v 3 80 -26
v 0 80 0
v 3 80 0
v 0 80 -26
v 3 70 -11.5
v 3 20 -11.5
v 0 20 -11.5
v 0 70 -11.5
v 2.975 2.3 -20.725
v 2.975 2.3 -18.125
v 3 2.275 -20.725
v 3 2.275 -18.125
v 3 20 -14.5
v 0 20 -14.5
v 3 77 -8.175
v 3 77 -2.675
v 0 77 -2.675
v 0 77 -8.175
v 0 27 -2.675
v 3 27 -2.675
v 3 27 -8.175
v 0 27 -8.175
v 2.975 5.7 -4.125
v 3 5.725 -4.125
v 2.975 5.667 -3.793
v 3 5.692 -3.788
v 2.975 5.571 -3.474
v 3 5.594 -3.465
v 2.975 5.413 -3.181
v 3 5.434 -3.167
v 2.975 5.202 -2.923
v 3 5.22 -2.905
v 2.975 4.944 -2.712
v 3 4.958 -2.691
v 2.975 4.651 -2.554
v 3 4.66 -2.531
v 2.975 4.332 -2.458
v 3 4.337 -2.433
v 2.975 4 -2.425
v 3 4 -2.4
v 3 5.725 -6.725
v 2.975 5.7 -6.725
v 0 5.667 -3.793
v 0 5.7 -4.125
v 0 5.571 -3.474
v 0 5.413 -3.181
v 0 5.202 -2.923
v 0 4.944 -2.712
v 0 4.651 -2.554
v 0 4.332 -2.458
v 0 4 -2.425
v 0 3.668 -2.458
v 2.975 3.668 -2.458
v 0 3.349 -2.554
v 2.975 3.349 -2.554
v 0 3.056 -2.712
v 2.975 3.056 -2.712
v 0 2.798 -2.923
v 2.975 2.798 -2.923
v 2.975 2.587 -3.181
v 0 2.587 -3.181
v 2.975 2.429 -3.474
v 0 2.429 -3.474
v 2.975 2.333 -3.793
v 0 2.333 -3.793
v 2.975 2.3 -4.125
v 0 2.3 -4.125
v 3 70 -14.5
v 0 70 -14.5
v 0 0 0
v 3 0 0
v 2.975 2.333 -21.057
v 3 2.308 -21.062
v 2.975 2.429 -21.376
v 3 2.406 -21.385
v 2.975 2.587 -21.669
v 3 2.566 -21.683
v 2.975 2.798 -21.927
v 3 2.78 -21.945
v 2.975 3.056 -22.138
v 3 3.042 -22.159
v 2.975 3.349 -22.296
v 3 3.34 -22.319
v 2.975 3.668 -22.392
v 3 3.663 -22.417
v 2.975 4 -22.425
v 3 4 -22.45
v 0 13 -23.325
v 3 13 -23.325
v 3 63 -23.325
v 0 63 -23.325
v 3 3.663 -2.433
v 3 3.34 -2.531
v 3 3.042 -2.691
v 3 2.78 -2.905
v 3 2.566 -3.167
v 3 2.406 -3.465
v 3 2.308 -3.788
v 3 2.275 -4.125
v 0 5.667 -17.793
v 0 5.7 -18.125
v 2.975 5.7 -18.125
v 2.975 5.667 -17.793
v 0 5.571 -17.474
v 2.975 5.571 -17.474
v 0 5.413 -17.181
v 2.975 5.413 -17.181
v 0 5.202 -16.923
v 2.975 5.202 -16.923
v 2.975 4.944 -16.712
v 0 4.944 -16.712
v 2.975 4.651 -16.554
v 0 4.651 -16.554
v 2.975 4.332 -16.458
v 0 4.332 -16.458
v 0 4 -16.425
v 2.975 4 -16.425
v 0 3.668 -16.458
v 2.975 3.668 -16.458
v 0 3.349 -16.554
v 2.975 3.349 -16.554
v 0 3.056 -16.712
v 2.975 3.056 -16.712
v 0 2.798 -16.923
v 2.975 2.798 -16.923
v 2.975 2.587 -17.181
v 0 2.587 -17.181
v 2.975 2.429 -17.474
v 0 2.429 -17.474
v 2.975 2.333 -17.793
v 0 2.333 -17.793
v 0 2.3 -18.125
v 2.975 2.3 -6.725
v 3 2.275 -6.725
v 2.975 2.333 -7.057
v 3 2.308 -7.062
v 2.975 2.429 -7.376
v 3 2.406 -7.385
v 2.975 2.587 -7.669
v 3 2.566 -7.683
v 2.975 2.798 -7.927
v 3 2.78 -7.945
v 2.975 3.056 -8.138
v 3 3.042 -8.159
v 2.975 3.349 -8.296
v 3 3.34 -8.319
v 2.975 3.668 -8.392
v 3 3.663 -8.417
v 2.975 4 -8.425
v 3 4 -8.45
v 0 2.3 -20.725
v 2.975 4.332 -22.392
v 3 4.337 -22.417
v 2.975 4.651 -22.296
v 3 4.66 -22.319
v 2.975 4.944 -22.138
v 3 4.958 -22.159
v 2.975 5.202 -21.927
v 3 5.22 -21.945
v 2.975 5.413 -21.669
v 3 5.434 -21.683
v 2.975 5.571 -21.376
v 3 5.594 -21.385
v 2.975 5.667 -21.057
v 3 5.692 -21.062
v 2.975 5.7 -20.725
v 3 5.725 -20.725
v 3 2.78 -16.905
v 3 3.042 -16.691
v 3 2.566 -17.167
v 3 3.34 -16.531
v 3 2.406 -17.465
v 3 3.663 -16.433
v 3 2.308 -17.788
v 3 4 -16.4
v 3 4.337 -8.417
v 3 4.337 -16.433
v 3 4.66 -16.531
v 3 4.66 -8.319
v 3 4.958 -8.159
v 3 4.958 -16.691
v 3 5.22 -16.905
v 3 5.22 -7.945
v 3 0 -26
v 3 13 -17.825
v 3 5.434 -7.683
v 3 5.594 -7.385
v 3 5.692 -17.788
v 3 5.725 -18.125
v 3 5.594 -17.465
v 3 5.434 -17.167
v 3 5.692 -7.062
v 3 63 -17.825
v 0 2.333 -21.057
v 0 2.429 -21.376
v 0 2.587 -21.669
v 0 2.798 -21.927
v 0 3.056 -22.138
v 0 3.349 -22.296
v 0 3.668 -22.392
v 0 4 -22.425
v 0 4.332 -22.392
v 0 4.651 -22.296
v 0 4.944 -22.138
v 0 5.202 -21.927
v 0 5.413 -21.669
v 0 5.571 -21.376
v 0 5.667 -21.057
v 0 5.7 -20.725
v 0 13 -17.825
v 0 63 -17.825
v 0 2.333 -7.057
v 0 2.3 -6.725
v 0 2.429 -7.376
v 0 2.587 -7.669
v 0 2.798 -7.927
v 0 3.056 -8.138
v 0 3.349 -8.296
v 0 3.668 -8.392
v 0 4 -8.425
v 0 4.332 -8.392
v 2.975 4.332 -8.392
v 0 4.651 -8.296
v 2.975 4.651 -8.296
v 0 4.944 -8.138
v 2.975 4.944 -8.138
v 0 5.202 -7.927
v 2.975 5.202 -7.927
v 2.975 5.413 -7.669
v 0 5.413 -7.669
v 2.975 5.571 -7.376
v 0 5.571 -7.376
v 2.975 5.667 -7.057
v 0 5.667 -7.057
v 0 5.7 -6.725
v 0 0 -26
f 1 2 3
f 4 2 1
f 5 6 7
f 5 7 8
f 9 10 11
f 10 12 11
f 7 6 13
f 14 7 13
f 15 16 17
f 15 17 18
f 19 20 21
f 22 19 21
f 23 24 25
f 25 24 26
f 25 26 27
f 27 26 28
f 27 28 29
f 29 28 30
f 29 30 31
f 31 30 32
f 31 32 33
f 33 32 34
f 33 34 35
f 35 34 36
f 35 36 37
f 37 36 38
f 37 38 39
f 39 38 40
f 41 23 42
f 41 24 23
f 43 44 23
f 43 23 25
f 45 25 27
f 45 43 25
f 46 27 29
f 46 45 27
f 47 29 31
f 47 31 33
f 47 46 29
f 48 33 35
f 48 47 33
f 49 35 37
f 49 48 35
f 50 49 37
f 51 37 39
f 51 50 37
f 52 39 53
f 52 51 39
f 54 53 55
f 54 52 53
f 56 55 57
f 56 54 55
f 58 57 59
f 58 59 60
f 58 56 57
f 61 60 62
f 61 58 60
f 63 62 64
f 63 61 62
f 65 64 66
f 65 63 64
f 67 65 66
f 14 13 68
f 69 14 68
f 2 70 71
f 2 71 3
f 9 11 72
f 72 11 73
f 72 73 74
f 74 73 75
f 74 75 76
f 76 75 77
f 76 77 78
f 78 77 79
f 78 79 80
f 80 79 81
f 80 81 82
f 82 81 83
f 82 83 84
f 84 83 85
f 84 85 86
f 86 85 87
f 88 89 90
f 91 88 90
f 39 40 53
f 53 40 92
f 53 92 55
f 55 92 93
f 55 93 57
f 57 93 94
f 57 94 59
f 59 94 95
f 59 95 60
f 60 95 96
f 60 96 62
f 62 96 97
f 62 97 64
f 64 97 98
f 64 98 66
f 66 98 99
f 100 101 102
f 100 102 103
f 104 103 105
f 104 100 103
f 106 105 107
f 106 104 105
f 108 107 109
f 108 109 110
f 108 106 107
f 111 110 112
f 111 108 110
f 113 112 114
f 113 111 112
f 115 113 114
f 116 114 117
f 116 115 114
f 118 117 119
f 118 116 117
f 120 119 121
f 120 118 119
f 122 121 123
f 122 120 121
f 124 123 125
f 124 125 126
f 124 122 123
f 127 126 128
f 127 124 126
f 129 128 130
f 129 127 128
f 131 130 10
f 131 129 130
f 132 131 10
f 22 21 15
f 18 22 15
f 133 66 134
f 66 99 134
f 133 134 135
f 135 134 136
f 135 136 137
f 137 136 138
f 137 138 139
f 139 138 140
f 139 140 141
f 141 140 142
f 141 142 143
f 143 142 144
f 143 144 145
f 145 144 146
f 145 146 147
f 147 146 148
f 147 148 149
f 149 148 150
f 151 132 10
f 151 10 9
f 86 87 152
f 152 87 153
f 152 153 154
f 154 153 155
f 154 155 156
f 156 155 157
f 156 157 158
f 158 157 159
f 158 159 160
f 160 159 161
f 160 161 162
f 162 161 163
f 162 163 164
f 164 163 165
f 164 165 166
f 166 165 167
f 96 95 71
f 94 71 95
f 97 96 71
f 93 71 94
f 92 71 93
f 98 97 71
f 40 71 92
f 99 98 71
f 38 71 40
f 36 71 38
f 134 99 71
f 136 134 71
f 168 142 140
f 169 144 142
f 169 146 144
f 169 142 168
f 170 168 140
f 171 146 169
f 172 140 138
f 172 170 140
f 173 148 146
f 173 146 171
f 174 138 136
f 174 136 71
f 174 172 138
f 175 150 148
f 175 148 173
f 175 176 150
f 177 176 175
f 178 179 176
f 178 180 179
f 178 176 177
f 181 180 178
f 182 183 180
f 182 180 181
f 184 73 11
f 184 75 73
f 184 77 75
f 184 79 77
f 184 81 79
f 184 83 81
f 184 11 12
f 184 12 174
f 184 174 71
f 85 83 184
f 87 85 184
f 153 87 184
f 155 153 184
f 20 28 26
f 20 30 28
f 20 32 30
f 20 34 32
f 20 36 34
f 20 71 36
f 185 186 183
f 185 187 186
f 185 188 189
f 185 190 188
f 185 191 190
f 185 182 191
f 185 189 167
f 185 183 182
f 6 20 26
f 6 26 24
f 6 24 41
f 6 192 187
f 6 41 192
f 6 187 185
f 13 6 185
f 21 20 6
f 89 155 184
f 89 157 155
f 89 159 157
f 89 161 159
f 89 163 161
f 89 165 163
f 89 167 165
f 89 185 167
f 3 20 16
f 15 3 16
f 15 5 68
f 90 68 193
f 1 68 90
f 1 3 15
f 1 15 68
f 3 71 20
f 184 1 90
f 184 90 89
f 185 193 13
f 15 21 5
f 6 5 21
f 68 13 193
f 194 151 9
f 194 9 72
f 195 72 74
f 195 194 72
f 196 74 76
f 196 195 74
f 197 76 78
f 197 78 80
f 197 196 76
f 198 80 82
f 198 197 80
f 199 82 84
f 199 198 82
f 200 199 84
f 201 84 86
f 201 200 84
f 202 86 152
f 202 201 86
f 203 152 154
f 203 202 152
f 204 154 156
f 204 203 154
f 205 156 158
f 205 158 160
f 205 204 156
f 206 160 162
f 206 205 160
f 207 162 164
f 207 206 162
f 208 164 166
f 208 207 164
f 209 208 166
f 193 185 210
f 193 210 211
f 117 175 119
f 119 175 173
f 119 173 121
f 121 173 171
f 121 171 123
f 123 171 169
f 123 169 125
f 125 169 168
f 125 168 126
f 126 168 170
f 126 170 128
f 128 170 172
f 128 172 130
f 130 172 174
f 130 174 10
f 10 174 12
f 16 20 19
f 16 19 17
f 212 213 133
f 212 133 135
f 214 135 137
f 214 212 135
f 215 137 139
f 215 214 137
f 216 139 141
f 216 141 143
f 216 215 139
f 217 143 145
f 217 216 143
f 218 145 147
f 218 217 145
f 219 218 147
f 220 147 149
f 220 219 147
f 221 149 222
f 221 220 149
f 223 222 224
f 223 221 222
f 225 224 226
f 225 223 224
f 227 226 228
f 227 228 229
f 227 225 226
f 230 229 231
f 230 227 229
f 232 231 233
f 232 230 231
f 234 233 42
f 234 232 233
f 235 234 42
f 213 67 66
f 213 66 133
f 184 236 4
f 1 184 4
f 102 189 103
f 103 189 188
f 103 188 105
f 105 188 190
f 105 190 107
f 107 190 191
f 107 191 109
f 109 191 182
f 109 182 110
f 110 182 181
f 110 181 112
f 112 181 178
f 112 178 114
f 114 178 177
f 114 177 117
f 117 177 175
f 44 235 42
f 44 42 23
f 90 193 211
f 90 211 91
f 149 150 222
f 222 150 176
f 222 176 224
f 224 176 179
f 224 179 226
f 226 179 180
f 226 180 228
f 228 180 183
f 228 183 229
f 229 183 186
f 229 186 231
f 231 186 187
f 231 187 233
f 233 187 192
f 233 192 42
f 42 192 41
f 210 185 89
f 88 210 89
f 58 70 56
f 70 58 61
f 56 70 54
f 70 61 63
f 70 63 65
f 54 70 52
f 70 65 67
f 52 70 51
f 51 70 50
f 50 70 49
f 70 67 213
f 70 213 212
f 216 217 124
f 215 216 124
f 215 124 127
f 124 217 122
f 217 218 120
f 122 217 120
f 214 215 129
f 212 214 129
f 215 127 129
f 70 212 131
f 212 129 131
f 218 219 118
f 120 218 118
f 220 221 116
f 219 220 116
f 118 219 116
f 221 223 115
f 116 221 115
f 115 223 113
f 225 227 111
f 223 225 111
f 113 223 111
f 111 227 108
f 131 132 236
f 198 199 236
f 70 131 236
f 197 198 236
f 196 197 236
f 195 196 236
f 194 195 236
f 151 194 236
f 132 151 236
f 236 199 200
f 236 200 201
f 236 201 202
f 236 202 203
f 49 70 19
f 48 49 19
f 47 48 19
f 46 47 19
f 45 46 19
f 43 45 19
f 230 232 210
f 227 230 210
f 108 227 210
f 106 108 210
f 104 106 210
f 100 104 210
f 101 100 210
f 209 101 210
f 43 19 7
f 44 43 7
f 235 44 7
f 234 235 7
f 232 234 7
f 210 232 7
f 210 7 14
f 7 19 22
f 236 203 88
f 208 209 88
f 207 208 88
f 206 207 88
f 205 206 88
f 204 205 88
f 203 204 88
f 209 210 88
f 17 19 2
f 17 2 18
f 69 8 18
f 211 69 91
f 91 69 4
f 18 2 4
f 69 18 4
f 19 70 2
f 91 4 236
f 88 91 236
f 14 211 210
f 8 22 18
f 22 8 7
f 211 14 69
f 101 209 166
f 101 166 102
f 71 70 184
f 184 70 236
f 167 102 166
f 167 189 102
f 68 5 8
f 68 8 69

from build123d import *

# Parameters (mm, degrees)
SKETCH1_W                = 26
SKETCH1_H                = 80
BOSS_EXTRUDE1_DEPTH      = 3
SKETCH2_W                = 5.5
SKETCH2_H                = 50
SKETCH2_W_2              = 3
CUT_EXTRUDE1_DEPTH       = 3
M3_START                 = -1
M3_CLEARANCE_SLOT1_DEPTH = 5


with BuildPart() as part:
    # Sketch1 → Boss-Extrude1 (new body)
    with BuildSketch(Plane(origin=(0, 0, 0), x_dir=(0, 0, -1), z_dir=(1, 0, 0))):
        with Locations((13, 40)):
            Rectangle(SKETCH1_W, SKETCH1_H)
    extrude(amount=BOSS_EXTRUDE1_DEPTH)

    # Sketch2 → Cut-Extrude1 (cut)
    with BuildSketch(Plane(origin=(3, 0, 0), x_dir=(0, 0, -1), z_dir=(1, 0, 0))):
        with Locations((5.425, 52)):
            Rectangle(SKETCH2_W, SKETCH2_H)
        with Locations((13, 45)):
            Rectangle(SKETCH2_W_2, SKETCH2_H)
        with Locations((20.575, 38)):
            Rectangle(SKETCH2_W, SKETCH2_H)
    extrude(amount=-CUT_EXTRUDE1_DEPTH, mode=Mode.SUBTRACT)

    # M3 Clearance Slot1: read off the stored shape, not the designer's step
    # M3 Clearance Slot1 outline → M3 Clearance Slot1 (cut)
    with BuildSketch(Plane.YZ.offset(M3_START)):
        with BuildLine():
            Line((5.7, -20.725), (5.7, -18.125))
            ThreePointArc((5.7, -18.125), (4, -16.425), (2.3, -18.125))
            Line((2.3, -18.125), (2.3, -20.725))
            ThreePointArc((2.3, -20.725), (4, -22.425), (5.7, -20.725))
        make_face()
        with BuildLine():
            ThreePointArc((5.7, -4.125), (4, -2.425), (2.3, -4.125))
            Line((2.3, -4.125), (2.3, -6.725))
            ThreePointArc((2.3, -6.725), (4, -8.425), (5.7, -6.725))
            Line((5.7, -6.725), (5.7, -4.125))
        make_face()
    extrude(amount=M3_CLEARANCE_SLOT1_DEPTH, mode=Mode.SUBTRACT)

    # M3 Clearance Slot1 2: loft between two sections, ruled curve by curve
    m3_clearance_slot1_2_from = [
        Edge.make_three_point_arc((2.975, 5.7, -18.125), (2.975, 5.202081528, -16.922918472), (2.975, 4, -16.425)),
        Edge.make_three_point_arc((2.975, 4, -16.425), (2.975, 2.797918472, -16.922918472), (2.975, 2.3, -18.125)),
        Edge.make_three_point_arc((2.975, 2.3, -20.725), (2.975, 2.797918472, -21.927081528), (2.975, 4, -22.425)),
        Edge.make_three_point_arc((2.975, 4, -22.425), (2.975, 5.202081528, -21.927081528), (2.975, 5.7, -20.725)),
        Edge.make_line((2.975, 2.3, -18.125), (2.975, 2.3, -20.725)),
        Edge.make_line((2.975, 5.7, -18.125), (2.975, 5.7, -20.725)),
    ]
    m3_clearance_slot1_2_to = [
        Edge.make_three_point_arc((3, 5.725, -18.125), (3, 5.219759198, -16.905240802), (3, 4, -16.4)),
        Edge.make_three_point_arc((3, 4, -16.4), (3, 2.780240802, -16.905240802), (3, 2.275, -18.125)),
        Edge.make_three_point_arc((3, 2.275, -20.725), (3, 2.780240802, -21.944759198), (3, 4, -22.45)),
        Edge.make_three_point_arc((3, 4, -22.45), (3, 5.219759198, -21.944759198), (3, 5.725, -20.725)),
        Edge.make_line((3, 2.275, -18.125), (3, 2.275, -20.725)),
        Edge.make_line((3, 5.725, -18.125), (3, 5.725, -20.725)),
    ]
    m3_clearance_slot1_2 = Solid(Shell([*[Face.make_surface_from_curves(m3_clearance_slot1_2_from[k], m3_clearance_slot1_2_to[k]) for k in range(6)], Face(Wire(m3_clearance_slot1_2_from)), Face(Wire(m3_clearance_slot1_2_to))]))
    add(m3_clearance_slot1_2, mode=Mode.SUBTRACT)

    # M3 Clearance Slot1 3: loft between two sections, ruled curve by curve
    m3_clearance_slot1_3_from = [
        Edge.make_three_point_arc((2.975, 5.7, -4.125), (2.975, 5.202081528, -2.922918472), (2.975, 4, -2.425)),
        Edge.make_three_point_arc((2.975, 4, -2.425), (2.975, 2.797918472, -2.922918472), (2.975, 2.3, -4.125)),
        Edge.make_three_point_arc((2.975, 2.3, -6.725), (2.975, 2.797918472, -7.927081528), (2.975, 4, -8.425)),
        Edge.make_three_point_arc((2.975, 4, -8.425), (2.975, 5.202081528, -7.927081528), (2.975, 5.7, -6.725)),
        Edge.make_line((2.975, 2.3, -4.125), (2.975, 2.3, -6.725)),
        Edge.make_line((2.975, 5.7, -4.125), (2.975, 5.7, -6.725)),
    ]
    m3_clearance_slot1_3_to = [
        Edge.make_three_point_arc((3, 5.725, -4.125), (3, 5.219759198, -2.905240802), (3, 4, -2.4)),
        Edge.make_three_point_arc((3, 4, -2.4), (3, 2.780240802, -2.905240802), (3, 2.275, -4.125)),
        Edge.make_three_point_arc((3, 2.275, -6.725), (3, 2.780240802, -7.944759198), (3, 4, -8.45)),
        Edge.make_three_point_arc((3, 4, -8.45), (3, 5.219759198, -7.944759198), (3, 5.725, -6.725)),
        Edge.make_line((3, 2.275, -4.125), (3, 2.275, -6.725)),
        Edge.make_line((3, 5.725, -4.125), (3, 5.725, -6.725)),
    ]
    m3_clearance_slot1_3 = Solid(Shell([*[Face.make_surface_from_curves(m3_clearance_slot1_3_from[k], m3_clearance_slot1_3_to[k]) for k in range(6)], Face(Wire(m3_clearance_slot1_3_from)), Face(Wire(m3_clearance_slot1_3_to))]))
    add(m3_clearance_slot1_3, mode=Mode.SUBTRACT)


solid = part.part
